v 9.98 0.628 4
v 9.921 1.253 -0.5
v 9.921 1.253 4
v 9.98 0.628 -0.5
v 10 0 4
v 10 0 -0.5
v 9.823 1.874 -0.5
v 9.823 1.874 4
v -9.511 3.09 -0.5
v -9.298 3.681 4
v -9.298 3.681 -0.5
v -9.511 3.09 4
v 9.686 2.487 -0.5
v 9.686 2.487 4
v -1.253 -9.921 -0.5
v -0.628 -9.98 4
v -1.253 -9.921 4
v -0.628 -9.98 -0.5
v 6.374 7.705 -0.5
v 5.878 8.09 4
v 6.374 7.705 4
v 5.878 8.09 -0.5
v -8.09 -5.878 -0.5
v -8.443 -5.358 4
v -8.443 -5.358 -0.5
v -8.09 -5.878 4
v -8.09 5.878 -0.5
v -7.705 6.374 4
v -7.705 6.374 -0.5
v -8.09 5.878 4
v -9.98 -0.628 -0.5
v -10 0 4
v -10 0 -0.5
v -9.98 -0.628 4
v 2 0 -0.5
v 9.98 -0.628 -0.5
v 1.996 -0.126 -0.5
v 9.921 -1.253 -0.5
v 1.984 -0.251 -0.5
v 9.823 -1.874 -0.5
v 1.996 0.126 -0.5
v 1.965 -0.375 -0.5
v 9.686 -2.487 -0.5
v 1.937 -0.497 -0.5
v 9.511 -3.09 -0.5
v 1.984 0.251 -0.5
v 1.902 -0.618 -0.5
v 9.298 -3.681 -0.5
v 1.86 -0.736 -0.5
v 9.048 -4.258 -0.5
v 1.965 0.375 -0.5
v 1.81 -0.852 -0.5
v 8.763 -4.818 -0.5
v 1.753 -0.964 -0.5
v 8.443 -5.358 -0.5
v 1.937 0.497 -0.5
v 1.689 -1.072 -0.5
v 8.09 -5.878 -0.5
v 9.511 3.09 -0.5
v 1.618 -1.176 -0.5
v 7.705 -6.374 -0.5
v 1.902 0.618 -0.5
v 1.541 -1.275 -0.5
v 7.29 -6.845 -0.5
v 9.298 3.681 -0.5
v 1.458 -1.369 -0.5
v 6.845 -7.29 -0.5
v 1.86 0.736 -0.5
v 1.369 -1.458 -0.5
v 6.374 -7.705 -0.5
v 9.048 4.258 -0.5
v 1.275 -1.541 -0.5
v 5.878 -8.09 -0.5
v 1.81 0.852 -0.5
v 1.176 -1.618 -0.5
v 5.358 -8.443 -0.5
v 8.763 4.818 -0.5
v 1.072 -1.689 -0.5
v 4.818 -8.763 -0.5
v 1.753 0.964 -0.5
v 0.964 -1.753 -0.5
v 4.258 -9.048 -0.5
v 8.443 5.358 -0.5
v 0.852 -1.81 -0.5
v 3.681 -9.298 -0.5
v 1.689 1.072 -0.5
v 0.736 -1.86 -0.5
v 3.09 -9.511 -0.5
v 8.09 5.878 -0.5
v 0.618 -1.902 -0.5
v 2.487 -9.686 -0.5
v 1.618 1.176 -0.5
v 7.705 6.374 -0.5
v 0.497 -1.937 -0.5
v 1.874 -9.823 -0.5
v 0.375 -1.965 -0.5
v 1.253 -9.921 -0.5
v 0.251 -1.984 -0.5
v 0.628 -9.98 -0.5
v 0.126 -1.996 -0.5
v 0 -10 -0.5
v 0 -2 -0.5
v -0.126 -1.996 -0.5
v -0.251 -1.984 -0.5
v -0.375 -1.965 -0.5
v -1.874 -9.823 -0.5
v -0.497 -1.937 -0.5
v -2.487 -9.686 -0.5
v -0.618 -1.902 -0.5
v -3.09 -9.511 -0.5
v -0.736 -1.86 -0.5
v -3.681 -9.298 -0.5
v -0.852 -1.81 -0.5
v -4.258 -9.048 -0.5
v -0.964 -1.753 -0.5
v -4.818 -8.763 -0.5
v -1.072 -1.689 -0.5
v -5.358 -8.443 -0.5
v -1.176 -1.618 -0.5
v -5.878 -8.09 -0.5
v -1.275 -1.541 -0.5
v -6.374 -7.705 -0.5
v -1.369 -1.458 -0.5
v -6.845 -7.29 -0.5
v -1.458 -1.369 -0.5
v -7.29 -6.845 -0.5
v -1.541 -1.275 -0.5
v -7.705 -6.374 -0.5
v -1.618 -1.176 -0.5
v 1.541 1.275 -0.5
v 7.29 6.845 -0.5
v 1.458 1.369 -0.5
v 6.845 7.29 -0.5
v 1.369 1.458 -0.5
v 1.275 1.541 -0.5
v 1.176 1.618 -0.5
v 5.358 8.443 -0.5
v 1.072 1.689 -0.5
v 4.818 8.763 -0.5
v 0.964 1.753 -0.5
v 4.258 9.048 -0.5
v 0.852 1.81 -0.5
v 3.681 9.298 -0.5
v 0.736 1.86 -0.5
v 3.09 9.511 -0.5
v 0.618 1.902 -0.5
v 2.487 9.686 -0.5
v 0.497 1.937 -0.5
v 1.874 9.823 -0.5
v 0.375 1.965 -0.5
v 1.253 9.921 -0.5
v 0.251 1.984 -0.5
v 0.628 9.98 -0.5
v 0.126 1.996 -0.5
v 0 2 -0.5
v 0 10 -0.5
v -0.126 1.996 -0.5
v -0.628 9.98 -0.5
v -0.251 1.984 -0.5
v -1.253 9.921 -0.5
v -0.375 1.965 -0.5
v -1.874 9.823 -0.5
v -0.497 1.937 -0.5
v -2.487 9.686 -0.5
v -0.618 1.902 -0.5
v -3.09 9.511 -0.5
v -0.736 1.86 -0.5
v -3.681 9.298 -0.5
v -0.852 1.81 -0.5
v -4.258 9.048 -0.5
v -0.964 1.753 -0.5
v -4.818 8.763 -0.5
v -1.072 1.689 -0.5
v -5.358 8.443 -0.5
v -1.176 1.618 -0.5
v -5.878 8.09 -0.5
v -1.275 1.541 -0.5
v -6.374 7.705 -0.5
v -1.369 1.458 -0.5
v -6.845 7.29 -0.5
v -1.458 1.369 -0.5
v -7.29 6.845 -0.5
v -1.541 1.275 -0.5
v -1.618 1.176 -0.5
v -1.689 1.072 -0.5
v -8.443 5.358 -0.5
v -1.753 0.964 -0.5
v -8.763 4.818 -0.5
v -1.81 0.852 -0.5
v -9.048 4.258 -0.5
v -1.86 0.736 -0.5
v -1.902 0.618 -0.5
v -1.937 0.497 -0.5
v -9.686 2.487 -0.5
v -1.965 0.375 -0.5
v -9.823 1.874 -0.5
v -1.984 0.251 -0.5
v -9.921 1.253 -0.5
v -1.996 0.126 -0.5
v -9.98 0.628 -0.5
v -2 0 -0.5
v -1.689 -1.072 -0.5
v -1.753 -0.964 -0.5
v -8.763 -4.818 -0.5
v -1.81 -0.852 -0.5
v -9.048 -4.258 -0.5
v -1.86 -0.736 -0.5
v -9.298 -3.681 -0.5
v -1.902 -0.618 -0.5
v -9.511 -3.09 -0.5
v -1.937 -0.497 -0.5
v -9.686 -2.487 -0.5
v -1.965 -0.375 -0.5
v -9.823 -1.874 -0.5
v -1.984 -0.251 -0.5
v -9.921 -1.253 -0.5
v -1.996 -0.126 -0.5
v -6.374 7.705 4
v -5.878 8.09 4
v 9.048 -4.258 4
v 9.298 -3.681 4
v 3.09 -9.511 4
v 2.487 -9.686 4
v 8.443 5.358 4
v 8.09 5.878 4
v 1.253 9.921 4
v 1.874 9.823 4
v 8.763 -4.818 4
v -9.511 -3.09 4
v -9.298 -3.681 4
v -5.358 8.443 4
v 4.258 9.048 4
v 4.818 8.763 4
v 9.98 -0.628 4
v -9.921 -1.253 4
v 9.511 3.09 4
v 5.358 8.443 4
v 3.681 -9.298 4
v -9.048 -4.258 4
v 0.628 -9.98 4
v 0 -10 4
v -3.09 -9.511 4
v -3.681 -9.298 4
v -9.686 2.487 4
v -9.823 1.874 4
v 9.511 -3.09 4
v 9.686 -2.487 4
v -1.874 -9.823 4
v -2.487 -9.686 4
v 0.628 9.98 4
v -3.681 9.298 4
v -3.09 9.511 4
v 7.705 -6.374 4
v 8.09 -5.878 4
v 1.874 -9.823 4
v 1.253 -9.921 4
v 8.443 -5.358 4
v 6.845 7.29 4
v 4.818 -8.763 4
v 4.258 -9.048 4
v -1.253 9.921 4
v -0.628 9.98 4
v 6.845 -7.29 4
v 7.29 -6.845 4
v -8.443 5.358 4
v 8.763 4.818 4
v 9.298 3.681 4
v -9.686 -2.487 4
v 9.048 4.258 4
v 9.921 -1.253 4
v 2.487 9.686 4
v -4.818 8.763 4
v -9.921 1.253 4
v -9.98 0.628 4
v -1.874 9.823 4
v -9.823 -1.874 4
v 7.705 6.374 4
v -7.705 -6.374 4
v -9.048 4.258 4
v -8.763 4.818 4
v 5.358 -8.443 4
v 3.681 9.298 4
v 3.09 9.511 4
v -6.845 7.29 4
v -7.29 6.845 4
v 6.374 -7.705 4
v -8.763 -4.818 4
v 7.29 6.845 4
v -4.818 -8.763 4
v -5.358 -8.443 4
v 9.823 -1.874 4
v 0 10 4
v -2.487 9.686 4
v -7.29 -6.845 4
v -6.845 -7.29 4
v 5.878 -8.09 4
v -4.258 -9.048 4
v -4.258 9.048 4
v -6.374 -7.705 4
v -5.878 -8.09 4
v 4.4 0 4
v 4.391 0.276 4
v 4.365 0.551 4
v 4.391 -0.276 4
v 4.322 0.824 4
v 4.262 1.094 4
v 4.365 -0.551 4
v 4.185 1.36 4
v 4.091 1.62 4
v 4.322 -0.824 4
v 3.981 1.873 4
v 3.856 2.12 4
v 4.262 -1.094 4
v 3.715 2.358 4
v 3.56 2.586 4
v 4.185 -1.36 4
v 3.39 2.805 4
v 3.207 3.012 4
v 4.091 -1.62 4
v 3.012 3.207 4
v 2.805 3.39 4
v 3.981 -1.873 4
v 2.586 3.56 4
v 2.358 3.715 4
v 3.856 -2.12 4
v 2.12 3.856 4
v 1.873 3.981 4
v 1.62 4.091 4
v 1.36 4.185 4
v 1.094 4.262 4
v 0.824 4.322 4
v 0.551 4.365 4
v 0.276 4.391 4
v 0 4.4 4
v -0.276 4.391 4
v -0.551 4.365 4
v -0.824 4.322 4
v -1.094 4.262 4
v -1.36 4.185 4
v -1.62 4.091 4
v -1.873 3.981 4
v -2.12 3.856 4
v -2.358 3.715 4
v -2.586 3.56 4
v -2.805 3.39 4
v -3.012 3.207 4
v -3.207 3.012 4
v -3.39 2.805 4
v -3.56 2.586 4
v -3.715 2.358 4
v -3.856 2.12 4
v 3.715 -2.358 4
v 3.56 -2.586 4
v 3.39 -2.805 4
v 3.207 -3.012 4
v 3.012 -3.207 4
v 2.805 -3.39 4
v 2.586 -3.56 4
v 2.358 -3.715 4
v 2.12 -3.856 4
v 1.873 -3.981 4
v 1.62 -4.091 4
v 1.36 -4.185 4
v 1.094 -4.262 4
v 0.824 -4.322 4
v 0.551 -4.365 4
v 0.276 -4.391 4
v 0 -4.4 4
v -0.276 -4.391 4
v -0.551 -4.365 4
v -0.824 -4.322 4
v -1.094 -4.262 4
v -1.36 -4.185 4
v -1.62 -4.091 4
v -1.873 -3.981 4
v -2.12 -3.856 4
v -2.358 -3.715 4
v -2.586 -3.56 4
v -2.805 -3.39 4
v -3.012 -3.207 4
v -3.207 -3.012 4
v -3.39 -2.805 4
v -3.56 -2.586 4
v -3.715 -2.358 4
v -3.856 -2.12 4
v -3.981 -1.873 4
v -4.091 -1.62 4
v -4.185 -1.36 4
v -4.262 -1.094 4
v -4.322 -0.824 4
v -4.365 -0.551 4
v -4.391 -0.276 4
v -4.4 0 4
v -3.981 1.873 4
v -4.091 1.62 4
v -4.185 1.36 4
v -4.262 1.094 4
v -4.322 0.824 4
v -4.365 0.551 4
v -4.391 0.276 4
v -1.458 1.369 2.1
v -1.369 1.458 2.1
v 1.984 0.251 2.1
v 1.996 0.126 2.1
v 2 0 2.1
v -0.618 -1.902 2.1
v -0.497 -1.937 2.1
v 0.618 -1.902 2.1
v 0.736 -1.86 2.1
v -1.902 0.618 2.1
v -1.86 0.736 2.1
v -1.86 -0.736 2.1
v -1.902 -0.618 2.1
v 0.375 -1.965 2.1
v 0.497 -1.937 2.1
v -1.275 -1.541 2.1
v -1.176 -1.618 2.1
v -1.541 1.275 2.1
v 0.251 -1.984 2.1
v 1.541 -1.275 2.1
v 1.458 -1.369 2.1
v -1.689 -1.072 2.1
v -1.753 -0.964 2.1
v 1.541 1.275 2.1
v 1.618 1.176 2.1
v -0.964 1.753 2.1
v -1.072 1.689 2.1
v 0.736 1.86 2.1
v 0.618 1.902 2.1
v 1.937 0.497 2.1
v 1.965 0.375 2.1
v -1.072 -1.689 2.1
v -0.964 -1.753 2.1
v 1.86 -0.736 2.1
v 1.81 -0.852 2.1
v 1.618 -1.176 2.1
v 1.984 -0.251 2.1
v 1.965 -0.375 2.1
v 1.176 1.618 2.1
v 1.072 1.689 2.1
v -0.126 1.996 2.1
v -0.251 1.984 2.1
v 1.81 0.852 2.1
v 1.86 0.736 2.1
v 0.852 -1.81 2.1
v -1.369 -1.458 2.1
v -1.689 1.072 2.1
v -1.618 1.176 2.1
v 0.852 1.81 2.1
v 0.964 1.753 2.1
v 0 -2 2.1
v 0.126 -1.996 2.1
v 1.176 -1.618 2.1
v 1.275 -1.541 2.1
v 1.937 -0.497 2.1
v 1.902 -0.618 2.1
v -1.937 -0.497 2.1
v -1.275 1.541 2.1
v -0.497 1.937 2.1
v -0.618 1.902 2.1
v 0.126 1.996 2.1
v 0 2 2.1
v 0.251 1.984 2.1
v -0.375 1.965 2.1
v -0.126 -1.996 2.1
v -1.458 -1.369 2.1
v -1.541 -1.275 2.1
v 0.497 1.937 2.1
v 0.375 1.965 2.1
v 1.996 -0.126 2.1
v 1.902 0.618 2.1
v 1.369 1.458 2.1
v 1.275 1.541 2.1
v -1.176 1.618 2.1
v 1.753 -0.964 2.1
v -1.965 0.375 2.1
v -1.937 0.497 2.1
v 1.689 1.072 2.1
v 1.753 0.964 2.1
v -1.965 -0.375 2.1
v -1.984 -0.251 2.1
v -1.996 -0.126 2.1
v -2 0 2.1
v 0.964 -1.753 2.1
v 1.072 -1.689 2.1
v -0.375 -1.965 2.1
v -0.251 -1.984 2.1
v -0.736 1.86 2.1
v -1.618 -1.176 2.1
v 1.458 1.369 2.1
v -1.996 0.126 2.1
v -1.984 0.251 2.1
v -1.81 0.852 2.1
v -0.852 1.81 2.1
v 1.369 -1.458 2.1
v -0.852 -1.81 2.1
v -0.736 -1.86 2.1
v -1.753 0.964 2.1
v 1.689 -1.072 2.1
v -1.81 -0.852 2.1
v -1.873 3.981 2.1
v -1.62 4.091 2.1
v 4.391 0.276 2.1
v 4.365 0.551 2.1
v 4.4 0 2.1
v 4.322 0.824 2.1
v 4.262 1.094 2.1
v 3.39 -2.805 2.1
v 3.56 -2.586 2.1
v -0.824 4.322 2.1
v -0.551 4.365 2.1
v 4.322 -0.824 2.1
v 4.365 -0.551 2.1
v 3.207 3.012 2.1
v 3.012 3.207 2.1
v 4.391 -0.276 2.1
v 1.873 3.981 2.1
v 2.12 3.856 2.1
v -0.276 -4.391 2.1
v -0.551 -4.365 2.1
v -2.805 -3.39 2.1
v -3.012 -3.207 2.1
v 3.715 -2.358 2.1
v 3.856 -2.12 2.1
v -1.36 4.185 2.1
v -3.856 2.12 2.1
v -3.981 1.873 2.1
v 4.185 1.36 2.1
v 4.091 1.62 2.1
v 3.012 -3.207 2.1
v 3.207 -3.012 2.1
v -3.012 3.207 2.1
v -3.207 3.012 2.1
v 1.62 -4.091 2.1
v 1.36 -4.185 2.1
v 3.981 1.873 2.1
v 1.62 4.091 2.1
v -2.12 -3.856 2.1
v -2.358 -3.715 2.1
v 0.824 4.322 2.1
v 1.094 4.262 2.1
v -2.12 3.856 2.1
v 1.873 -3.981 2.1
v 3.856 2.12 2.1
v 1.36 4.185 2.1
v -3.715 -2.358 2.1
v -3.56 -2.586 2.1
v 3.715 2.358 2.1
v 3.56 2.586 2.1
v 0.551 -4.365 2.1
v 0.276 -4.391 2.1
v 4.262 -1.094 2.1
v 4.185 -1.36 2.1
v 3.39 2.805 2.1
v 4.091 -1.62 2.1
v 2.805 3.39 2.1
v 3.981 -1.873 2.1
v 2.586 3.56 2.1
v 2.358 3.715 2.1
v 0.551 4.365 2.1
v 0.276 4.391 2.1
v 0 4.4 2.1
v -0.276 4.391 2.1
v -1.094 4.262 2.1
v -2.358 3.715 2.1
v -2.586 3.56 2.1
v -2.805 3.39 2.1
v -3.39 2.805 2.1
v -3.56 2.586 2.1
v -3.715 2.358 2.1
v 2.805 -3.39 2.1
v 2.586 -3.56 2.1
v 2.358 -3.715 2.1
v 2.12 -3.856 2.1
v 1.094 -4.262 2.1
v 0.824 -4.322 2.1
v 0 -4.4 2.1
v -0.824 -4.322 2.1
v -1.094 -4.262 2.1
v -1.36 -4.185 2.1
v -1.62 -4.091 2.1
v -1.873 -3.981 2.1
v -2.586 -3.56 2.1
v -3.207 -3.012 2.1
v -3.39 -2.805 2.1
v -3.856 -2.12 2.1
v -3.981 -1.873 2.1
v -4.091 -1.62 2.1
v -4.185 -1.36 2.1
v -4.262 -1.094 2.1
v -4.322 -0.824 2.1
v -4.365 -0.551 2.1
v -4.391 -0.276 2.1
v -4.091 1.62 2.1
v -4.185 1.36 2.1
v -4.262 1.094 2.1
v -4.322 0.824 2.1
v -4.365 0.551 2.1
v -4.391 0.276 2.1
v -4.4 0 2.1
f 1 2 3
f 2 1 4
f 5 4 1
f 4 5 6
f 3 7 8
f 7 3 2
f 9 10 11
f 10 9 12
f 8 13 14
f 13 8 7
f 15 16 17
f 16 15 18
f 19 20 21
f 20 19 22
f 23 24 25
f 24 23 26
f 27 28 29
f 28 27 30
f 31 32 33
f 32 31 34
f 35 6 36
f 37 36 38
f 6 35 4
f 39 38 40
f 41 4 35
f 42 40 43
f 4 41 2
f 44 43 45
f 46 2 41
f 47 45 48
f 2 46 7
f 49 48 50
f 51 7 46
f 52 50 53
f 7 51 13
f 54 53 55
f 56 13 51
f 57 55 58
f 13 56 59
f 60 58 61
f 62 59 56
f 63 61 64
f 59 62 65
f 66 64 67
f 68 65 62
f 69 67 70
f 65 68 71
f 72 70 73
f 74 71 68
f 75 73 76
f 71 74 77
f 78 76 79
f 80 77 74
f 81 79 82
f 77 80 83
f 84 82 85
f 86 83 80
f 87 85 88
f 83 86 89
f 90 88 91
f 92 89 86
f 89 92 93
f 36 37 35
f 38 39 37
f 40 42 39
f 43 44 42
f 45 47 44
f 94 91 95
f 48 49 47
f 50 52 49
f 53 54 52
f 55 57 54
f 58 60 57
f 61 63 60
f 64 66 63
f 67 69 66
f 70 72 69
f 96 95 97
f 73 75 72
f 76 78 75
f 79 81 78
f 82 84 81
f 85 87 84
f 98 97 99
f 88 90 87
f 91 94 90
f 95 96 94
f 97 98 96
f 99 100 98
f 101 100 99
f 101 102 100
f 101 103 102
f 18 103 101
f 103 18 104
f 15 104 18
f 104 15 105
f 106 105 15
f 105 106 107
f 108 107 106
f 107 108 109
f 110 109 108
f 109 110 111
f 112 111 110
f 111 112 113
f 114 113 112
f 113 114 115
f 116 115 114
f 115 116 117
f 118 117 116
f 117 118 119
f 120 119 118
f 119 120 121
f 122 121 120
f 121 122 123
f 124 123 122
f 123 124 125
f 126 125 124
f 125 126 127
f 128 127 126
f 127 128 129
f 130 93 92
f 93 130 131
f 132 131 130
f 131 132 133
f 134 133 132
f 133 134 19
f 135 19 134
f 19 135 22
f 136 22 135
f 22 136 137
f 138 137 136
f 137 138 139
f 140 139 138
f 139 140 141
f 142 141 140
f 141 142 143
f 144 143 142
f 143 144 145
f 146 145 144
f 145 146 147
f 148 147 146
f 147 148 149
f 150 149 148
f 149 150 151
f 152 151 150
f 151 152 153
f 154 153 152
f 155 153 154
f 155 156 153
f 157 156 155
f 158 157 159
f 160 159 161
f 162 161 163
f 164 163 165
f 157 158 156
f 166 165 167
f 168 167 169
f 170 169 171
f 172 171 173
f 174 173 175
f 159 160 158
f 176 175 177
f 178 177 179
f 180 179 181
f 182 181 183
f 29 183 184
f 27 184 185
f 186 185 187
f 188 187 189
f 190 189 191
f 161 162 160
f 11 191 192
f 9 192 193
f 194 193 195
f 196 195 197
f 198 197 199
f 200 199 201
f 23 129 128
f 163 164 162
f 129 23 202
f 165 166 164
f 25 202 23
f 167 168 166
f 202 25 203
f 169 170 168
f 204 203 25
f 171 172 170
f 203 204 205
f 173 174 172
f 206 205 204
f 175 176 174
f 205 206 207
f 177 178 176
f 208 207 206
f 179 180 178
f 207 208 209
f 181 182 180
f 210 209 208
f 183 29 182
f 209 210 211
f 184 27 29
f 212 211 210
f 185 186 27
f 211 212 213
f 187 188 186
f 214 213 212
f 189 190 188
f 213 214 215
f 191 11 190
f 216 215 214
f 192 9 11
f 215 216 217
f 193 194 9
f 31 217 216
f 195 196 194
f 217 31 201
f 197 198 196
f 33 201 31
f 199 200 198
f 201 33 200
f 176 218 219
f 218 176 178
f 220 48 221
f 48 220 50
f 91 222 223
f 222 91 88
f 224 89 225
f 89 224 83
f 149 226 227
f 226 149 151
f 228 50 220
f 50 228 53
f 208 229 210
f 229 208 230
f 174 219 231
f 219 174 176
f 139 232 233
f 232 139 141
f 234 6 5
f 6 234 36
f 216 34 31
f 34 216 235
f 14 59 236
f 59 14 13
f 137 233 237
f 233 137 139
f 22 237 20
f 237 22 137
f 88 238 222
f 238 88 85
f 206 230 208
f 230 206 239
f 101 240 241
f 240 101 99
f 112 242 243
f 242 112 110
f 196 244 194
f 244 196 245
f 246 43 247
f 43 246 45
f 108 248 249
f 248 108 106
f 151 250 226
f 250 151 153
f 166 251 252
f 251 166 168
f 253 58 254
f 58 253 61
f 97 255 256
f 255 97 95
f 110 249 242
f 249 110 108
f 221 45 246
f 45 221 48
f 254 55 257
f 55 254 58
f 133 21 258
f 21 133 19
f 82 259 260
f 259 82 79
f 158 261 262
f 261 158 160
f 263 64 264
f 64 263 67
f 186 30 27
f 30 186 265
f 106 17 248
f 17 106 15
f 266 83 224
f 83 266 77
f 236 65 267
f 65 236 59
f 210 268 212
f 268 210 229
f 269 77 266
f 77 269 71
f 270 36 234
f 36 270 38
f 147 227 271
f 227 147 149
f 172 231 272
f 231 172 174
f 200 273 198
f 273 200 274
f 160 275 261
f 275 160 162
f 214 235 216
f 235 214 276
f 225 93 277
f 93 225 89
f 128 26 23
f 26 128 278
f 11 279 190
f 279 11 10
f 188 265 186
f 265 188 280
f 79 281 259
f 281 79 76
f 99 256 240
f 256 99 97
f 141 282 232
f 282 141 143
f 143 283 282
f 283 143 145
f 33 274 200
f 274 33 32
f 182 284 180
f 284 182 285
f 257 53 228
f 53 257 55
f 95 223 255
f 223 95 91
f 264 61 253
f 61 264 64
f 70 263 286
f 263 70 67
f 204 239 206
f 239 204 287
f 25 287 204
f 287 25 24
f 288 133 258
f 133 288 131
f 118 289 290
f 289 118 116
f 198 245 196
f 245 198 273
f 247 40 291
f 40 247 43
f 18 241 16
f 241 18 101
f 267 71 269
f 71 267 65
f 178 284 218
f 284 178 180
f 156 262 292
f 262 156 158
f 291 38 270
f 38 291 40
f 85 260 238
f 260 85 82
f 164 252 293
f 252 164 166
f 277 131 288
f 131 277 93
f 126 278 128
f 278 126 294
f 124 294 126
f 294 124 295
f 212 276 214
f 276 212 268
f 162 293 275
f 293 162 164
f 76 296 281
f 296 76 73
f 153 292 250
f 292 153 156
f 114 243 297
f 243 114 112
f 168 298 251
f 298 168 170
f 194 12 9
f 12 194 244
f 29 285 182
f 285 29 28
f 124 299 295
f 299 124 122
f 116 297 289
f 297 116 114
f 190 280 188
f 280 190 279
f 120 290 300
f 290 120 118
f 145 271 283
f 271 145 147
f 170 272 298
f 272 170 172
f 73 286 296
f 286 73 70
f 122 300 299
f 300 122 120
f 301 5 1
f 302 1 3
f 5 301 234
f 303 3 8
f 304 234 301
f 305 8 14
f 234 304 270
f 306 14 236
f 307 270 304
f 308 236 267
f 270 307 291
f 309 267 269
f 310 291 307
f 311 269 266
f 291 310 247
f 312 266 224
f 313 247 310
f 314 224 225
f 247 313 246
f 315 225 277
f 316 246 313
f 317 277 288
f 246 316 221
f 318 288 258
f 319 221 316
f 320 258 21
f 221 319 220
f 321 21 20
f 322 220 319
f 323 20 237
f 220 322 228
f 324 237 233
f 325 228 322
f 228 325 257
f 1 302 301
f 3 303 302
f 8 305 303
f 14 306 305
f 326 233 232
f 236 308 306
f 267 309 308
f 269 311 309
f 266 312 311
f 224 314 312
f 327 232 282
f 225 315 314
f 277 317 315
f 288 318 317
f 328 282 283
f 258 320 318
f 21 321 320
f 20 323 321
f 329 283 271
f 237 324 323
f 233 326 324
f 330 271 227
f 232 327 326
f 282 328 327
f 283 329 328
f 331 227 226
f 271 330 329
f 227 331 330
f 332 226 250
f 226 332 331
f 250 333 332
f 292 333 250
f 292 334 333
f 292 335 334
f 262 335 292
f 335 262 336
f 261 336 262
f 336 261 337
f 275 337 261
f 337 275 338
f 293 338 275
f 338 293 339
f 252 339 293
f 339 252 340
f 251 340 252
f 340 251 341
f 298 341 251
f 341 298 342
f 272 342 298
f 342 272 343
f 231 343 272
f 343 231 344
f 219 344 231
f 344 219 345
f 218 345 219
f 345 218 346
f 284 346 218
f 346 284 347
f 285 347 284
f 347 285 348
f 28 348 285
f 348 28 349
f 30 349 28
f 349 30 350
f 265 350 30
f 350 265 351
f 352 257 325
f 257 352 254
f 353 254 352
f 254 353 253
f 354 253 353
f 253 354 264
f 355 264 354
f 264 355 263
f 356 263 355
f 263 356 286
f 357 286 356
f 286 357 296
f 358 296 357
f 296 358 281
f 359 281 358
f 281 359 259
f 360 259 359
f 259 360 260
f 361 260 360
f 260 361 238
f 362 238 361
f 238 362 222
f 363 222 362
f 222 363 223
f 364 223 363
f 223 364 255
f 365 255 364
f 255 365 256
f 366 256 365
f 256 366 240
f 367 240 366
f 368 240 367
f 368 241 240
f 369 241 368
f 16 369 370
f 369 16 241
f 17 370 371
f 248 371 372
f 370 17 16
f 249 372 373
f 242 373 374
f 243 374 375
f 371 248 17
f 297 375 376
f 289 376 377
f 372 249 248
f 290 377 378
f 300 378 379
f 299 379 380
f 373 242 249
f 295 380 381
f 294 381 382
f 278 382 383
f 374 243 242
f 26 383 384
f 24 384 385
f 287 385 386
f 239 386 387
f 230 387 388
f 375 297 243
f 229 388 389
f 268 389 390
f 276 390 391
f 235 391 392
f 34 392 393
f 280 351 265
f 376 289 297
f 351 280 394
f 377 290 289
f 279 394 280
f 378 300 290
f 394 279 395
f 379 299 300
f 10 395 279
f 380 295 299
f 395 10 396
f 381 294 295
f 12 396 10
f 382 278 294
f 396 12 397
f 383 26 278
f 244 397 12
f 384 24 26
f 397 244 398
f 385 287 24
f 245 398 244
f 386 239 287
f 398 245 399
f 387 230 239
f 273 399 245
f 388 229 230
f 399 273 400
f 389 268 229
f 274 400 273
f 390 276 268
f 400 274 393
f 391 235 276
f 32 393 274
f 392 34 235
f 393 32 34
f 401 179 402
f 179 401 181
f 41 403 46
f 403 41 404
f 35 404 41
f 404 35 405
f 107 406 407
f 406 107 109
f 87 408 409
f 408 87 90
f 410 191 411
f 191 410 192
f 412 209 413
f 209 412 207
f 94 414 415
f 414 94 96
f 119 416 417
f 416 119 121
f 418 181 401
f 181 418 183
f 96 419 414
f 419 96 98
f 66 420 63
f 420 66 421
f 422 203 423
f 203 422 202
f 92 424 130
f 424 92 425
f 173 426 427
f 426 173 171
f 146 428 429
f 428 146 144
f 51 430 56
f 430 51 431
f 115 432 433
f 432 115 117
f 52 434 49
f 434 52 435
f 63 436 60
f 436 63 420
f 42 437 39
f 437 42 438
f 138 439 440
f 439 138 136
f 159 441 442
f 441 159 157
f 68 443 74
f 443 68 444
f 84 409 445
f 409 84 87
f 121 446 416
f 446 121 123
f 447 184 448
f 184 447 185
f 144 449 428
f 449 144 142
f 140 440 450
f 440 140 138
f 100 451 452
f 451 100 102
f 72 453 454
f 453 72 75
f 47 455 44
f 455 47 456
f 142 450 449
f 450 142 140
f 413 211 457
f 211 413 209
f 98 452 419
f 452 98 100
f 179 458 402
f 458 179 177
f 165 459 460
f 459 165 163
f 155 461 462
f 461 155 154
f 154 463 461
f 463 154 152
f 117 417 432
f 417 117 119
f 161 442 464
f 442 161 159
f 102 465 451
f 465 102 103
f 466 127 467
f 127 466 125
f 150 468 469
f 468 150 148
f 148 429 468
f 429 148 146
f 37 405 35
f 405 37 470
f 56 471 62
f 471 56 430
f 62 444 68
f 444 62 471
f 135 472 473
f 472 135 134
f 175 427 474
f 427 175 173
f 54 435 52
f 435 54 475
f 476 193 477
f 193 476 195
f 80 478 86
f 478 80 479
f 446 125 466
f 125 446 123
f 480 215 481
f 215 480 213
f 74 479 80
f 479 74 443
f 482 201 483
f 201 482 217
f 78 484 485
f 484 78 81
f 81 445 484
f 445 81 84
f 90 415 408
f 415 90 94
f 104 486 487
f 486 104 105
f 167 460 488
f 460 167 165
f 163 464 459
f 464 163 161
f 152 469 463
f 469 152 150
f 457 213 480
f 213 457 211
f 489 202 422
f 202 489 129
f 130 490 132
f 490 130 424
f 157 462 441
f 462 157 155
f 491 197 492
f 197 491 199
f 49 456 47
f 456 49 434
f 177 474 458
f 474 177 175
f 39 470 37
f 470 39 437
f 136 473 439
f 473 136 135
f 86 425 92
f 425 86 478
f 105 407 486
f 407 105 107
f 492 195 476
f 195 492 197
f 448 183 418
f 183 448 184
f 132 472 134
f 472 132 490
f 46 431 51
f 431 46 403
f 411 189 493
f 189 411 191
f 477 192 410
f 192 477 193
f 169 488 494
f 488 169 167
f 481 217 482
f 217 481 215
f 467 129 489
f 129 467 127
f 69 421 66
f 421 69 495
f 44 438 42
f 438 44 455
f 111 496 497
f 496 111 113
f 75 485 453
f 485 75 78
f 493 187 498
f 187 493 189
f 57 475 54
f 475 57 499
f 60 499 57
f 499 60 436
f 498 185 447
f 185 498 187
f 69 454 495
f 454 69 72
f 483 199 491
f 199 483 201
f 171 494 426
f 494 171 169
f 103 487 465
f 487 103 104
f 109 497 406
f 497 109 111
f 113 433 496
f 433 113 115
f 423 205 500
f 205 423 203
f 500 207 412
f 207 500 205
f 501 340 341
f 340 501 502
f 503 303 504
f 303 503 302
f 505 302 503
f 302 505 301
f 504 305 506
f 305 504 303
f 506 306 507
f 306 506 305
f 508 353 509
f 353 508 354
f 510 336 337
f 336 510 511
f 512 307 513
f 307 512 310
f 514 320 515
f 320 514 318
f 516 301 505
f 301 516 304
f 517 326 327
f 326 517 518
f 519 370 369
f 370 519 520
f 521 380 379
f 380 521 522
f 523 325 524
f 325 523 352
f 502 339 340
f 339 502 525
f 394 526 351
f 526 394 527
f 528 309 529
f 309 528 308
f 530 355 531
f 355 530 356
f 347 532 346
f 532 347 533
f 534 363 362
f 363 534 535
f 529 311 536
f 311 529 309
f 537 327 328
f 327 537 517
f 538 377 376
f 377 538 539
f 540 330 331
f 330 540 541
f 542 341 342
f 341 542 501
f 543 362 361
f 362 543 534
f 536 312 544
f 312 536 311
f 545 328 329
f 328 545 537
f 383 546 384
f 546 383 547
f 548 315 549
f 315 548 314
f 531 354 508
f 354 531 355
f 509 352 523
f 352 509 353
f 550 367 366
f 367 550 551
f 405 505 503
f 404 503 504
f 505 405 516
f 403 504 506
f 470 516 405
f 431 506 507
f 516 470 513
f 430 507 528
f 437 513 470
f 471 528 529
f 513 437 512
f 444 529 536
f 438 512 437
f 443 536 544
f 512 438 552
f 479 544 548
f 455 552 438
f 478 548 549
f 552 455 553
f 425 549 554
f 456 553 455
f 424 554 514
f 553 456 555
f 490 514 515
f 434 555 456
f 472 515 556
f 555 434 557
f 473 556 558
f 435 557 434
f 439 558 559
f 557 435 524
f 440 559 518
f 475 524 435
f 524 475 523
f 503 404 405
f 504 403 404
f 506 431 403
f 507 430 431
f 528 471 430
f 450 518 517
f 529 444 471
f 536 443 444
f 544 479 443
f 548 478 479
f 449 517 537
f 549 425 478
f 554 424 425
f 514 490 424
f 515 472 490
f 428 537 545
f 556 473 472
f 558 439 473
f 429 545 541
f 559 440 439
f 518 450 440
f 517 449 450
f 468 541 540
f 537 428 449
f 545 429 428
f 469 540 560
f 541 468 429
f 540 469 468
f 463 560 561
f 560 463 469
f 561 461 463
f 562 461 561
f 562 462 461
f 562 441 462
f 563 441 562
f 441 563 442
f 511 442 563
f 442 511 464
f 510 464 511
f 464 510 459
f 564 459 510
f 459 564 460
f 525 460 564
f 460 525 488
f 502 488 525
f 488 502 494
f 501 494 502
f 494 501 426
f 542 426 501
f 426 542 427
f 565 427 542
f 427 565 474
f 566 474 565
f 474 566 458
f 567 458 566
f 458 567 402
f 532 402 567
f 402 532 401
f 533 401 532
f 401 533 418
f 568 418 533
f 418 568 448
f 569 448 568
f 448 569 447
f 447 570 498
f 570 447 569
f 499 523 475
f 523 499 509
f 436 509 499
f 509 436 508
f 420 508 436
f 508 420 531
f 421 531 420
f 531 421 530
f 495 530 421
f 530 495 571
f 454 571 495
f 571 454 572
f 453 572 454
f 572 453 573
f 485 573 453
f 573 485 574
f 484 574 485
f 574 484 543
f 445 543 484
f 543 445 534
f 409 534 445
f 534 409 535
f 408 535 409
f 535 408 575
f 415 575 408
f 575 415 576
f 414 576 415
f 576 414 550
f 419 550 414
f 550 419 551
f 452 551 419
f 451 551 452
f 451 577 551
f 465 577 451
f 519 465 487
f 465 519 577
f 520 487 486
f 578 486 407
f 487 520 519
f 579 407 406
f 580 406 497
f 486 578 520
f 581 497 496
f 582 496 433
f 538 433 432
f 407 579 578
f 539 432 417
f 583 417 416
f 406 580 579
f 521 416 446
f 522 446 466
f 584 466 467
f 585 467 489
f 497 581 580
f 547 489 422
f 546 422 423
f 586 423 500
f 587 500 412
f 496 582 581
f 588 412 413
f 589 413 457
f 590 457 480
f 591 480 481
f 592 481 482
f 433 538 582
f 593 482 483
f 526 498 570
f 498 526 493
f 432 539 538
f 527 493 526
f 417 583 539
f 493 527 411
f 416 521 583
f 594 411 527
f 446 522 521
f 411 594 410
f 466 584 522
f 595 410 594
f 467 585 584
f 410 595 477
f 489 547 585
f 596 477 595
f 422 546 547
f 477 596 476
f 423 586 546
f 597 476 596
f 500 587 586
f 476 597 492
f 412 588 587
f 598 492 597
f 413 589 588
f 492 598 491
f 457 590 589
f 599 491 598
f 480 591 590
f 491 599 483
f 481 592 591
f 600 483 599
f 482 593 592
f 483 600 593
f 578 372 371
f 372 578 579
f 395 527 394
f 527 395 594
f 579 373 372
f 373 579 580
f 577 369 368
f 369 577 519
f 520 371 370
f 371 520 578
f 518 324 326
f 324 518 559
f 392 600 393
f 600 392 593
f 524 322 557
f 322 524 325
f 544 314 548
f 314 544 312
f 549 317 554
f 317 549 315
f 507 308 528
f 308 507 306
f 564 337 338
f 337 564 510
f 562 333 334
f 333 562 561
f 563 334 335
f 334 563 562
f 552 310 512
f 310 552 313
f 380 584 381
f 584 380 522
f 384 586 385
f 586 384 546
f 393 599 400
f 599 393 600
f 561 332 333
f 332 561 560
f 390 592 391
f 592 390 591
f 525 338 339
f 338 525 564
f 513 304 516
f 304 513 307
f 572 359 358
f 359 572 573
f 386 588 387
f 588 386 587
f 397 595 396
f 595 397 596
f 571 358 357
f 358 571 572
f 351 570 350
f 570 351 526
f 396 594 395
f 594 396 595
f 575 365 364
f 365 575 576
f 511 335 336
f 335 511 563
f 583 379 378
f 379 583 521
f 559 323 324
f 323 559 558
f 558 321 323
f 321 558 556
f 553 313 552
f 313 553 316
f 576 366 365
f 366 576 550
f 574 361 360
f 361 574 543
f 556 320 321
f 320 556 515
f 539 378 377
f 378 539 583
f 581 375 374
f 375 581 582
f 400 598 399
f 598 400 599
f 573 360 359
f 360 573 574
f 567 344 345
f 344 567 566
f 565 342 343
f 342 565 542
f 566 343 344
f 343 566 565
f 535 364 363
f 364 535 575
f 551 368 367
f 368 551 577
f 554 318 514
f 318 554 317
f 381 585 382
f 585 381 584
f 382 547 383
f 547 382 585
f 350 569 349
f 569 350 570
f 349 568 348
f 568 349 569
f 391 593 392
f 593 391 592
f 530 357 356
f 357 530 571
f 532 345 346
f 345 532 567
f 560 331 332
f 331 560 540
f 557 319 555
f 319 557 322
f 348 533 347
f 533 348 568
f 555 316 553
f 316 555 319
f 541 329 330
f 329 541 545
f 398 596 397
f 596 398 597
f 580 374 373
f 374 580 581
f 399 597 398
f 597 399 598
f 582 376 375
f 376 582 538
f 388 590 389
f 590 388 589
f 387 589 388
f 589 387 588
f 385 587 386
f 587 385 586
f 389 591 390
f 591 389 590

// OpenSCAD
// finish_washer.scad
// library for parametric finishing washer, button, ring, pad, accent
// Author: Tony Z. Tonchev, Michigan (USA) 
// last update: November 2018

// Washer diameter (in mm): 3x or larger than Screw Gauge.
Washer_Diameter = 20;

// General washer shape
Washer_Type = 1; //[1:CYLINDER, 2:CONE, 3:CHAMFER, 4:DOME]

// Screw shaft diameter (in mm): #4-3mm, #6-3.5mm, #8-4mm, #9-4.5mm, #10-5mm
Screw_Gauge = 4;

// General screw head type
Screw_Head_Type = 1; //[1:FLUSH, 2:RECESSED]

/* [Hidden] */

$fn=100;
TZT_Rad = Washer_Diameter/2;
TZT_Sad = Screw_Gauge/2;
TZT_Thk = Screw_Gauge;
TZT_Wty = Washer_Type;
TZT_Sty = Screw_Head_Type;

difference () {
    TZT_Washer ();
    TZT_Hole ();
}

//-----------------

module TZT_Washer () {
    translate ([0,0,-0.5]) cylinder (0.5, TZT_Rad, TZT_Rad);
    if (TZT_Wty==2) {
        cylinder (TZT_Thk, TZT_Rad, TZT_Sad*2);
    } else if (TZT_Wty==3) {
        cylinder (TZT_Thk*0.7, TZT_Rad, TZT_Rad);
        translate ([0,0,TZT_Thk*0.7]) cylinder (TZT_Thk*0.3, TZT_Rad, TZT_Rad-TZT_Thk*0.3);
    } else if (TZT_Wty==4) {
        difference () {
            scale ([1,1,TZT_Thk/TZT_Rad]) sphere (TZT_Rad);
            translate ([0,0,-TZT_Thk]) cylinder (TZT_Thk, TZT_Rad, TZT_Rad);
        }
    } else {
        cylinder (TZT_Thk, TZT_Rad, TZT_Rad);
    }
}

module TZT_Hole () {
    translate ([0,0,-1]) cylinder (TZT_Thk*9, TZT_Sad, TZT_Sad);
    if (TZT_Sty==2) {
        translate  ([0,0,TZT_Sad+0.1]) cylinder (TZT_Sad, TZT_Sad, TZT_Sad*2);
    } else {
        translate  ([0,0,TZT_Sad+0.1]) cylinder (TZT_Sad, TZT_Sad*2.2, TZT_Sad*2.2);
    }
}
